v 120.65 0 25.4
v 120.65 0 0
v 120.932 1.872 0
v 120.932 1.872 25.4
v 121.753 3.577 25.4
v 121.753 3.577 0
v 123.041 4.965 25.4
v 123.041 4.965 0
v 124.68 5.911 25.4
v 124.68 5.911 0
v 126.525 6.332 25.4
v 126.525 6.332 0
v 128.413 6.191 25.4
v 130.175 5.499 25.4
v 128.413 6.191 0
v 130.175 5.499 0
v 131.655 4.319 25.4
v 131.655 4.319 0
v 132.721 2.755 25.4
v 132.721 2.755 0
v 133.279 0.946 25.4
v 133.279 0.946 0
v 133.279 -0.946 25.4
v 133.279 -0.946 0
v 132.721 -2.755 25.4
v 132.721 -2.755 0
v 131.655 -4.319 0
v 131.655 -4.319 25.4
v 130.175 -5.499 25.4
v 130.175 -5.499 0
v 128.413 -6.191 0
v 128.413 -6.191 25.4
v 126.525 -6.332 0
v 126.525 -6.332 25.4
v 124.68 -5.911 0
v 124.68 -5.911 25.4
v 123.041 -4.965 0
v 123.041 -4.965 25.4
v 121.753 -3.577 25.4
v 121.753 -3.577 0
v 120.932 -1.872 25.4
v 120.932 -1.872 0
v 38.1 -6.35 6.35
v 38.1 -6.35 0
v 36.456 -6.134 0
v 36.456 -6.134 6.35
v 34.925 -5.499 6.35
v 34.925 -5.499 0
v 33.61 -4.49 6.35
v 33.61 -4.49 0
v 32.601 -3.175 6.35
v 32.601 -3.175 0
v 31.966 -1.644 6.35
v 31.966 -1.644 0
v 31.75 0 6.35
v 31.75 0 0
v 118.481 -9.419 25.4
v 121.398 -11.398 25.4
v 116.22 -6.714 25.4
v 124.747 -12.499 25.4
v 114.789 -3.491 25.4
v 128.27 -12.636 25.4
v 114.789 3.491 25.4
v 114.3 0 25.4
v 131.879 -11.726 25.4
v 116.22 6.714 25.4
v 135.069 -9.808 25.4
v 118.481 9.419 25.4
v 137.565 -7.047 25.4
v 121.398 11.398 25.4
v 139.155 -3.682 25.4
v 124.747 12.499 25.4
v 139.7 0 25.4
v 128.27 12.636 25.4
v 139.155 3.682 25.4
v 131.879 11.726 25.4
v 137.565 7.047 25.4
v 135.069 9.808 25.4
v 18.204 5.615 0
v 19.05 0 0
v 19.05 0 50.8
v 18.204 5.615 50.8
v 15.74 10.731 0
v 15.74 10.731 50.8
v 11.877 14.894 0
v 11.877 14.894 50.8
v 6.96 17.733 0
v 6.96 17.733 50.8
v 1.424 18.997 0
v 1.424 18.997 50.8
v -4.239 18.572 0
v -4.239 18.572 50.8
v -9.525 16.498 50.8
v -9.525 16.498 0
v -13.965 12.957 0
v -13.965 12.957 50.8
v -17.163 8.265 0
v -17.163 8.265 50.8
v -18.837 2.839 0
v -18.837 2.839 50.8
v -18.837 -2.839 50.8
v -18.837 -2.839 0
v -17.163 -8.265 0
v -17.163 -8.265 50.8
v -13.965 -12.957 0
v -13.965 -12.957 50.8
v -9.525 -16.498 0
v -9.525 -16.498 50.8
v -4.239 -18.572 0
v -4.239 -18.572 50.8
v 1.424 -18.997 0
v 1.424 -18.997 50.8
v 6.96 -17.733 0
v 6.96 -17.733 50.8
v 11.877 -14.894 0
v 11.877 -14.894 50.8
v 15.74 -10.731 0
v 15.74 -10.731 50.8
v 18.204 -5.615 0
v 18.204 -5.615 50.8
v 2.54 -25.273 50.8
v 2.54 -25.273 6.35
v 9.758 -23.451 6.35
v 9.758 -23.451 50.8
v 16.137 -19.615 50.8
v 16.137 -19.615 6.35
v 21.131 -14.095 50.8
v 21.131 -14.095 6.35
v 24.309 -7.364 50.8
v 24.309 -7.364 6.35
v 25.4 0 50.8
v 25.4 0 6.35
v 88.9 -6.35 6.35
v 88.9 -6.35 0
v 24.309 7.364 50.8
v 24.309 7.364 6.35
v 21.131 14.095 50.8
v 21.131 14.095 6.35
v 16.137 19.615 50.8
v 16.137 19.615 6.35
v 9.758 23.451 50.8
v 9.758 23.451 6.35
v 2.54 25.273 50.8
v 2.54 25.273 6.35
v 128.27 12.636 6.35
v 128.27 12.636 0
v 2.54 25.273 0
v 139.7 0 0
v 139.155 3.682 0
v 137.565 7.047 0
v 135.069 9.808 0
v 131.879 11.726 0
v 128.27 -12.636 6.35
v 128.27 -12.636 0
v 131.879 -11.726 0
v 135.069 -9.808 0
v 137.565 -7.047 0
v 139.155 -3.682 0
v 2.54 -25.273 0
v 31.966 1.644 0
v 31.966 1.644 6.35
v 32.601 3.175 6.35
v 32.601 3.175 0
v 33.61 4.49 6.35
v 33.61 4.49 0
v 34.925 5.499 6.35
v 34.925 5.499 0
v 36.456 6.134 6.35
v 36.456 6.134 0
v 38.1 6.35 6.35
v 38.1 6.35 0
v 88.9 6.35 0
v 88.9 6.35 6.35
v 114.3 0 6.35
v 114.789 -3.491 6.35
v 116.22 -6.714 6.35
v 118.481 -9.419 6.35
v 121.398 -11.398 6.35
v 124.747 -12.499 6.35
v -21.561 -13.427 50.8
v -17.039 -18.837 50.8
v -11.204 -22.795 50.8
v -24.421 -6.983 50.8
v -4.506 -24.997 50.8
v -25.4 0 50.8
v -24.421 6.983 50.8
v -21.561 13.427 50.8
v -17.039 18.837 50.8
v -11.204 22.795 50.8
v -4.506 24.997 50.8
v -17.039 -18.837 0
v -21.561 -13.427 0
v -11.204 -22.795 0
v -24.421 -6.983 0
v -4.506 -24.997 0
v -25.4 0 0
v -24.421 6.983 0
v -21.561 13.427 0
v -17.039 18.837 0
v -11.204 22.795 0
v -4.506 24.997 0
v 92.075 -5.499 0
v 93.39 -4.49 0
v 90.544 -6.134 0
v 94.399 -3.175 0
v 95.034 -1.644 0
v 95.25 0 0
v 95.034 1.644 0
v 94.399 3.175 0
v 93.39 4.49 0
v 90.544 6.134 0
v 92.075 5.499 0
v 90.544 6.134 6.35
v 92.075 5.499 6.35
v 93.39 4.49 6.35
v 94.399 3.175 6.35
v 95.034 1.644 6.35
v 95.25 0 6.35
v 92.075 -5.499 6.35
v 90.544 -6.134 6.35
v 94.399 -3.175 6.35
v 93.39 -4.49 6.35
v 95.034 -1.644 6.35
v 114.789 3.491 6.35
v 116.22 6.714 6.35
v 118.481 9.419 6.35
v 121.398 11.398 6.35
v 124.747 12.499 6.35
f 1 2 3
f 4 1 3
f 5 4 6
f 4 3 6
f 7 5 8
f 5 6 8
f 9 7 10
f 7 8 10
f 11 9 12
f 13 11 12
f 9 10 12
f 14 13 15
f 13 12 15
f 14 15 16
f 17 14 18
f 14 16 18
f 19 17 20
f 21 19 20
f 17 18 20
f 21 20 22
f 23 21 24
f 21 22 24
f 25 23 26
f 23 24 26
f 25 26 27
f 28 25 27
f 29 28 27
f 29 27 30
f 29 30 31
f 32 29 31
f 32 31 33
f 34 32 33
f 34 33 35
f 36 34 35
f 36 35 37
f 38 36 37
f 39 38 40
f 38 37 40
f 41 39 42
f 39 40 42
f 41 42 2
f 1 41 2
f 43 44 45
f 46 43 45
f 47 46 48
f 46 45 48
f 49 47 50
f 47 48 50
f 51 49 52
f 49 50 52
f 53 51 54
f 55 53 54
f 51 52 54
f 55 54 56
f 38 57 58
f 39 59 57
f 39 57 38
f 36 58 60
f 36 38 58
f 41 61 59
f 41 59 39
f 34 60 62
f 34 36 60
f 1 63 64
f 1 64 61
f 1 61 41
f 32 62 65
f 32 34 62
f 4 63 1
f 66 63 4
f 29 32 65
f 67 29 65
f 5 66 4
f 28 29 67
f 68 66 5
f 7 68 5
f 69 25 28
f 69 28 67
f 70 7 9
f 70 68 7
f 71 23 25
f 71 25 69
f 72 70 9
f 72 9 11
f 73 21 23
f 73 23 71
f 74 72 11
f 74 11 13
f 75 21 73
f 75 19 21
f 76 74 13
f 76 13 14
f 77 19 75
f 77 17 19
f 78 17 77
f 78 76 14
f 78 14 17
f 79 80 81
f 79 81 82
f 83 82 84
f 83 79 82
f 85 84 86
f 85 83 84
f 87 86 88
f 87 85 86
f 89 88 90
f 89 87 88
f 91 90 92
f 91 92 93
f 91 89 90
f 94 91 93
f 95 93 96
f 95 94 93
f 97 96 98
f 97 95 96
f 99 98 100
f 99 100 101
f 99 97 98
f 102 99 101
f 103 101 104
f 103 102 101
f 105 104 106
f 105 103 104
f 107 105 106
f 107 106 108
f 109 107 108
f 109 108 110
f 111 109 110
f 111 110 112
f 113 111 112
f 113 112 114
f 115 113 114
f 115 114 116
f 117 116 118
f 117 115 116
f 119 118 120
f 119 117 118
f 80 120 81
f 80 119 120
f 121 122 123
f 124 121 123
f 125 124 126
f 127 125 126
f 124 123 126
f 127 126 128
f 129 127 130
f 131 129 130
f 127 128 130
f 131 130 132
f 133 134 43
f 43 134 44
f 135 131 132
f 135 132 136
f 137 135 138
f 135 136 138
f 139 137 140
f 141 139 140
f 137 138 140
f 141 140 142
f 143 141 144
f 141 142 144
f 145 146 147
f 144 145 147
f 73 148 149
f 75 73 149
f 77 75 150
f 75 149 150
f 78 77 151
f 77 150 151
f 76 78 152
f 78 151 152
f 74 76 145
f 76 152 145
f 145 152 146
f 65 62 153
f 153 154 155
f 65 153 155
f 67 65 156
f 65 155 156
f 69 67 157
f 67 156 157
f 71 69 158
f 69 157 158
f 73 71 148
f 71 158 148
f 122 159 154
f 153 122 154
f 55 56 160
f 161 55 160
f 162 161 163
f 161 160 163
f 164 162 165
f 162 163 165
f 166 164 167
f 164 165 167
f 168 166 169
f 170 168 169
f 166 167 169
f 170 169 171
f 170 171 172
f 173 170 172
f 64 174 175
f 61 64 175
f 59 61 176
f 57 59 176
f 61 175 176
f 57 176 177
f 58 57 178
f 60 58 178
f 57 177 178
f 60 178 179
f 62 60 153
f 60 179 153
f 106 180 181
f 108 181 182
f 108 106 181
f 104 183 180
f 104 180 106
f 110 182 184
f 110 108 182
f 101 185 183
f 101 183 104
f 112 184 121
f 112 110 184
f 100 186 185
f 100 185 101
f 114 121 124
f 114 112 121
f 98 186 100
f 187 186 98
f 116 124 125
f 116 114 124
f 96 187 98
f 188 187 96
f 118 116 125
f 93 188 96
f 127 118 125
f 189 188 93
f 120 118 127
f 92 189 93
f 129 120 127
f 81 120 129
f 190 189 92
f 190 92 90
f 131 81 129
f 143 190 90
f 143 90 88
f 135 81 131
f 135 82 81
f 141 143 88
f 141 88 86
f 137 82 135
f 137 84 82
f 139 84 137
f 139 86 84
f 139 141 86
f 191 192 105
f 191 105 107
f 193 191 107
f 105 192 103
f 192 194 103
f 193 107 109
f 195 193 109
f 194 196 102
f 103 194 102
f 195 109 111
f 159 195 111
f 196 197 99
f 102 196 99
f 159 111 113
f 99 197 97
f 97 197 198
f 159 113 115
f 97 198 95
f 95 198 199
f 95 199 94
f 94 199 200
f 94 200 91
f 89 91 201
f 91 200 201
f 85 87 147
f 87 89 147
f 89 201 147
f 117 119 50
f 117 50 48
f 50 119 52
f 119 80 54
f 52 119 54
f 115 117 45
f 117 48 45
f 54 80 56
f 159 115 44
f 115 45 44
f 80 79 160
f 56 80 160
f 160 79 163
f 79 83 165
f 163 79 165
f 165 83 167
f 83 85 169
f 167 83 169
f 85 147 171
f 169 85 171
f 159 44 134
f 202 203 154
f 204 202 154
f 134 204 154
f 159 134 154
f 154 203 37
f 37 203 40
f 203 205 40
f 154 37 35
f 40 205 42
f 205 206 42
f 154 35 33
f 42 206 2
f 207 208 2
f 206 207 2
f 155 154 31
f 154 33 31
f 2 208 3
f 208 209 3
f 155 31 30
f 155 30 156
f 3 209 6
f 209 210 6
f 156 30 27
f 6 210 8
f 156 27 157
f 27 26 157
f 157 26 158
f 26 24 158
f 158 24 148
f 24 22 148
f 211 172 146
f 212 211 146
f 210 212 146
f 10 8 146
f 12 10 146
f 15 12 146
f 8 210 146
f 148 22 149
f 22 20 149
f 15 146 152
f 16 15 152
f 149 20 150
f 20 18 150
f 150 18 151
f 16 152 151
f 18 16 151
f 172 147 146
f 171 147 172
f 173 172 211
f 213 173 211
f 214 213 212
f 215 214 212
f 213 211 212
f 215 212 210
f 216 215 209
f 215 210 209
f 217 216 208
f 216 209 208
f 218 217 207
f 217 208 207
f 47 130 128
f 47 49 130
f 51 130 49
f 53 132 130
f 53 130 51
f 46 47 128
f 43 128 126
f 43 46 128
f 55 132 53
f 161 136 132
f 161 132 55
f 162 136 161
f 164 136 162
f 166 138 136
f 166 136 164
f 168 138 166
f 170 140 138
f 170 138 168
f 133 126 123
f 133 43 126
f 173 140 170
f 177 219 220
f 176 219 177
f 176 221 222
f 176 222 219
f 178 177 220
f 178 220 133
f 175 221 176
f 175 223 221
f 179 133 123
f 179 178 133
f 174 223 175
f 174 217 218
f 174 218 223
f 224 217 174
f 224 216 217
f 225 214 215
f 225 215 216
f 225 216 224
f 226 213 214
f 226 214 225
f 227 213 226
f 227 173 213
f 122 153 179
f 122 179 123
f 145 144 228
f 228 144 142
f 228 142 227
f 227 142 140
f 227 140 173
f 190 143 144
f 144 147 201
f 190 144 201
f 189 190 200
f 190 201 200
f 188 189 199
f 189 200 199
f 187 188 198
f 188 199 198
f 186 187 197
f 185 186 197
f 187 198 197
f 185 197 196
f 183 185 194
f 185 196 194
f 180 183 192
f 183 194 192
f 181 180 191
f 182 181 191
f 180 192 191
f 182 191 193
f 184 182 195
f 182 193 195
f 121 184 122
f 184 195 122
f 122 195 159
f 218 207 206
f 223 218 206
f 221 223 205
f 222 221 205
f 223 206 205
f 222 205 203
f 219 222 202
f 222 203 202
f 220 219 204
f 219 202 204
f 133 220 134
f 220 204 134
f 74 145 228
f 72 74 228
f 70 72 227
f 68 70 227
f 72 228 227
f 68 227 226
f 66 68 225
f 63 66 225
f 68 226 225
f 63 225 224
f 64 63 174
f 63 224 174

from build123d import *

# Parameters (mm, degrees)
F1_DEPTH = 6.35
F2_DEPTH = 25.4
F0_R     = 19.05
F3_DEPTH = 50.8


# Not quite as in the source:
# - a length typed as a fraction of an inch, garbled in the dataset ("3 / 203.2 mm" for 3/8 in), is restored


with BuildPart() as f1:
    # F0 (on Top) → F1 (new body)
    with BuildSketch(Plane.XY):
        with BuildLine():
            ThreePointArc((2.54, 25.2726809025), (18.8371441572, 17.0388379885), (25.4, 0))
            Line((25.4, 0), (31.75, 0))
            ThreePointArc((31.75, 0), (33.6098719395, 4.4901280605), (38.1, 6.35))
            Line((38.1, 6.35), (88.9, 6.35))
            ThreePointArc((88.9, 6.35), (93.3901280605, 4.4901280605), (95.25, 0))
            Line((95.25, 0), (114.3, 0))
            ThreePointArc((114.3, 0), (118.4805810057, 9.4185720786), (128.27, 12.6363404513))
            Line((128.27, 12.6363404513), (2.54, 25.2726809025))
        make_face()
        with BuildLine():
            Line((31.75, 0), (25.4, 0))
            ThreePointArc((25.4, 0), (18.8371441572, -17.0388379885), (2.54, -25.2726809025))
            Line((2.54, -25.2726809025), (128.27, -12.6363404513))
            ThreePointArc((128.27, -12.6363404513), (118.4805810057, -9.4185720786), (114.3, 0))
            Line((114.3, 0), (95.25, 0))
            ThreePointArc((95.25, 0), (93.3901280605, -4.4901280605), (88.9, -6.35))
            Line((88.9, -6.35), (38.1, -6.35))
            ThreePointArc((38.1, -6.35), (33.6098719395, -4.4901280605), (31.75, 0))
        make_face()
    extrude(amount=F1_DEPTH)

    # F0 (on Top) → F2 (join)
    with BuildSketch(Plane.XY):
        with BuildLine():
            ThreePointArc((139.7, 0), (136.4185720786, 8.5194189943), (128.27, 12.6363404513))
            ThreePointArc((128.27, 12.6363404513), (118.4805810057, 9.4185720786), (114.3, 0))
            ThreePointArc((114.3, 0), (118.4805810057, -9.4185720786), (128.27, -12.6363404513))
            ThreePointArc((128.27, -12.6363404513), (136.4185720786, -8.5194189943), (139.7, 0))
        make_face()
        with BuildLine():
            ThreePointArc((133.35, 0), (127, -6.35), (120.65, 0))
            ThreePointArc((120.65, 0), (127, 6.35), (133.35, 0))
        make_face(mode=Mode.SUBTRACT)
    extrude(amount=F2_DEPTH)

    # F0 (on Top) → F3 (join)
    with BuildSketch(Plane.XY):
        with BuildLine():
            ThreePointArc((2.54, -25.2726809025), (18.8371441572, -17.0388379885), (25.4, 0))
            ThreePointArc((25.4, 0), (18.8371441572, 17.0388379885), (2.54, 25.2726809025))
            ThreePointArc((2.54, 25.2726809025), (-25.4, 0), (2.54, -25.2726809025))
        make_face()
        Circle(F0_R, mode=Mode.SUBTRACT)
    extrude(amount=F3_DEPTH)


solid = f1.part
